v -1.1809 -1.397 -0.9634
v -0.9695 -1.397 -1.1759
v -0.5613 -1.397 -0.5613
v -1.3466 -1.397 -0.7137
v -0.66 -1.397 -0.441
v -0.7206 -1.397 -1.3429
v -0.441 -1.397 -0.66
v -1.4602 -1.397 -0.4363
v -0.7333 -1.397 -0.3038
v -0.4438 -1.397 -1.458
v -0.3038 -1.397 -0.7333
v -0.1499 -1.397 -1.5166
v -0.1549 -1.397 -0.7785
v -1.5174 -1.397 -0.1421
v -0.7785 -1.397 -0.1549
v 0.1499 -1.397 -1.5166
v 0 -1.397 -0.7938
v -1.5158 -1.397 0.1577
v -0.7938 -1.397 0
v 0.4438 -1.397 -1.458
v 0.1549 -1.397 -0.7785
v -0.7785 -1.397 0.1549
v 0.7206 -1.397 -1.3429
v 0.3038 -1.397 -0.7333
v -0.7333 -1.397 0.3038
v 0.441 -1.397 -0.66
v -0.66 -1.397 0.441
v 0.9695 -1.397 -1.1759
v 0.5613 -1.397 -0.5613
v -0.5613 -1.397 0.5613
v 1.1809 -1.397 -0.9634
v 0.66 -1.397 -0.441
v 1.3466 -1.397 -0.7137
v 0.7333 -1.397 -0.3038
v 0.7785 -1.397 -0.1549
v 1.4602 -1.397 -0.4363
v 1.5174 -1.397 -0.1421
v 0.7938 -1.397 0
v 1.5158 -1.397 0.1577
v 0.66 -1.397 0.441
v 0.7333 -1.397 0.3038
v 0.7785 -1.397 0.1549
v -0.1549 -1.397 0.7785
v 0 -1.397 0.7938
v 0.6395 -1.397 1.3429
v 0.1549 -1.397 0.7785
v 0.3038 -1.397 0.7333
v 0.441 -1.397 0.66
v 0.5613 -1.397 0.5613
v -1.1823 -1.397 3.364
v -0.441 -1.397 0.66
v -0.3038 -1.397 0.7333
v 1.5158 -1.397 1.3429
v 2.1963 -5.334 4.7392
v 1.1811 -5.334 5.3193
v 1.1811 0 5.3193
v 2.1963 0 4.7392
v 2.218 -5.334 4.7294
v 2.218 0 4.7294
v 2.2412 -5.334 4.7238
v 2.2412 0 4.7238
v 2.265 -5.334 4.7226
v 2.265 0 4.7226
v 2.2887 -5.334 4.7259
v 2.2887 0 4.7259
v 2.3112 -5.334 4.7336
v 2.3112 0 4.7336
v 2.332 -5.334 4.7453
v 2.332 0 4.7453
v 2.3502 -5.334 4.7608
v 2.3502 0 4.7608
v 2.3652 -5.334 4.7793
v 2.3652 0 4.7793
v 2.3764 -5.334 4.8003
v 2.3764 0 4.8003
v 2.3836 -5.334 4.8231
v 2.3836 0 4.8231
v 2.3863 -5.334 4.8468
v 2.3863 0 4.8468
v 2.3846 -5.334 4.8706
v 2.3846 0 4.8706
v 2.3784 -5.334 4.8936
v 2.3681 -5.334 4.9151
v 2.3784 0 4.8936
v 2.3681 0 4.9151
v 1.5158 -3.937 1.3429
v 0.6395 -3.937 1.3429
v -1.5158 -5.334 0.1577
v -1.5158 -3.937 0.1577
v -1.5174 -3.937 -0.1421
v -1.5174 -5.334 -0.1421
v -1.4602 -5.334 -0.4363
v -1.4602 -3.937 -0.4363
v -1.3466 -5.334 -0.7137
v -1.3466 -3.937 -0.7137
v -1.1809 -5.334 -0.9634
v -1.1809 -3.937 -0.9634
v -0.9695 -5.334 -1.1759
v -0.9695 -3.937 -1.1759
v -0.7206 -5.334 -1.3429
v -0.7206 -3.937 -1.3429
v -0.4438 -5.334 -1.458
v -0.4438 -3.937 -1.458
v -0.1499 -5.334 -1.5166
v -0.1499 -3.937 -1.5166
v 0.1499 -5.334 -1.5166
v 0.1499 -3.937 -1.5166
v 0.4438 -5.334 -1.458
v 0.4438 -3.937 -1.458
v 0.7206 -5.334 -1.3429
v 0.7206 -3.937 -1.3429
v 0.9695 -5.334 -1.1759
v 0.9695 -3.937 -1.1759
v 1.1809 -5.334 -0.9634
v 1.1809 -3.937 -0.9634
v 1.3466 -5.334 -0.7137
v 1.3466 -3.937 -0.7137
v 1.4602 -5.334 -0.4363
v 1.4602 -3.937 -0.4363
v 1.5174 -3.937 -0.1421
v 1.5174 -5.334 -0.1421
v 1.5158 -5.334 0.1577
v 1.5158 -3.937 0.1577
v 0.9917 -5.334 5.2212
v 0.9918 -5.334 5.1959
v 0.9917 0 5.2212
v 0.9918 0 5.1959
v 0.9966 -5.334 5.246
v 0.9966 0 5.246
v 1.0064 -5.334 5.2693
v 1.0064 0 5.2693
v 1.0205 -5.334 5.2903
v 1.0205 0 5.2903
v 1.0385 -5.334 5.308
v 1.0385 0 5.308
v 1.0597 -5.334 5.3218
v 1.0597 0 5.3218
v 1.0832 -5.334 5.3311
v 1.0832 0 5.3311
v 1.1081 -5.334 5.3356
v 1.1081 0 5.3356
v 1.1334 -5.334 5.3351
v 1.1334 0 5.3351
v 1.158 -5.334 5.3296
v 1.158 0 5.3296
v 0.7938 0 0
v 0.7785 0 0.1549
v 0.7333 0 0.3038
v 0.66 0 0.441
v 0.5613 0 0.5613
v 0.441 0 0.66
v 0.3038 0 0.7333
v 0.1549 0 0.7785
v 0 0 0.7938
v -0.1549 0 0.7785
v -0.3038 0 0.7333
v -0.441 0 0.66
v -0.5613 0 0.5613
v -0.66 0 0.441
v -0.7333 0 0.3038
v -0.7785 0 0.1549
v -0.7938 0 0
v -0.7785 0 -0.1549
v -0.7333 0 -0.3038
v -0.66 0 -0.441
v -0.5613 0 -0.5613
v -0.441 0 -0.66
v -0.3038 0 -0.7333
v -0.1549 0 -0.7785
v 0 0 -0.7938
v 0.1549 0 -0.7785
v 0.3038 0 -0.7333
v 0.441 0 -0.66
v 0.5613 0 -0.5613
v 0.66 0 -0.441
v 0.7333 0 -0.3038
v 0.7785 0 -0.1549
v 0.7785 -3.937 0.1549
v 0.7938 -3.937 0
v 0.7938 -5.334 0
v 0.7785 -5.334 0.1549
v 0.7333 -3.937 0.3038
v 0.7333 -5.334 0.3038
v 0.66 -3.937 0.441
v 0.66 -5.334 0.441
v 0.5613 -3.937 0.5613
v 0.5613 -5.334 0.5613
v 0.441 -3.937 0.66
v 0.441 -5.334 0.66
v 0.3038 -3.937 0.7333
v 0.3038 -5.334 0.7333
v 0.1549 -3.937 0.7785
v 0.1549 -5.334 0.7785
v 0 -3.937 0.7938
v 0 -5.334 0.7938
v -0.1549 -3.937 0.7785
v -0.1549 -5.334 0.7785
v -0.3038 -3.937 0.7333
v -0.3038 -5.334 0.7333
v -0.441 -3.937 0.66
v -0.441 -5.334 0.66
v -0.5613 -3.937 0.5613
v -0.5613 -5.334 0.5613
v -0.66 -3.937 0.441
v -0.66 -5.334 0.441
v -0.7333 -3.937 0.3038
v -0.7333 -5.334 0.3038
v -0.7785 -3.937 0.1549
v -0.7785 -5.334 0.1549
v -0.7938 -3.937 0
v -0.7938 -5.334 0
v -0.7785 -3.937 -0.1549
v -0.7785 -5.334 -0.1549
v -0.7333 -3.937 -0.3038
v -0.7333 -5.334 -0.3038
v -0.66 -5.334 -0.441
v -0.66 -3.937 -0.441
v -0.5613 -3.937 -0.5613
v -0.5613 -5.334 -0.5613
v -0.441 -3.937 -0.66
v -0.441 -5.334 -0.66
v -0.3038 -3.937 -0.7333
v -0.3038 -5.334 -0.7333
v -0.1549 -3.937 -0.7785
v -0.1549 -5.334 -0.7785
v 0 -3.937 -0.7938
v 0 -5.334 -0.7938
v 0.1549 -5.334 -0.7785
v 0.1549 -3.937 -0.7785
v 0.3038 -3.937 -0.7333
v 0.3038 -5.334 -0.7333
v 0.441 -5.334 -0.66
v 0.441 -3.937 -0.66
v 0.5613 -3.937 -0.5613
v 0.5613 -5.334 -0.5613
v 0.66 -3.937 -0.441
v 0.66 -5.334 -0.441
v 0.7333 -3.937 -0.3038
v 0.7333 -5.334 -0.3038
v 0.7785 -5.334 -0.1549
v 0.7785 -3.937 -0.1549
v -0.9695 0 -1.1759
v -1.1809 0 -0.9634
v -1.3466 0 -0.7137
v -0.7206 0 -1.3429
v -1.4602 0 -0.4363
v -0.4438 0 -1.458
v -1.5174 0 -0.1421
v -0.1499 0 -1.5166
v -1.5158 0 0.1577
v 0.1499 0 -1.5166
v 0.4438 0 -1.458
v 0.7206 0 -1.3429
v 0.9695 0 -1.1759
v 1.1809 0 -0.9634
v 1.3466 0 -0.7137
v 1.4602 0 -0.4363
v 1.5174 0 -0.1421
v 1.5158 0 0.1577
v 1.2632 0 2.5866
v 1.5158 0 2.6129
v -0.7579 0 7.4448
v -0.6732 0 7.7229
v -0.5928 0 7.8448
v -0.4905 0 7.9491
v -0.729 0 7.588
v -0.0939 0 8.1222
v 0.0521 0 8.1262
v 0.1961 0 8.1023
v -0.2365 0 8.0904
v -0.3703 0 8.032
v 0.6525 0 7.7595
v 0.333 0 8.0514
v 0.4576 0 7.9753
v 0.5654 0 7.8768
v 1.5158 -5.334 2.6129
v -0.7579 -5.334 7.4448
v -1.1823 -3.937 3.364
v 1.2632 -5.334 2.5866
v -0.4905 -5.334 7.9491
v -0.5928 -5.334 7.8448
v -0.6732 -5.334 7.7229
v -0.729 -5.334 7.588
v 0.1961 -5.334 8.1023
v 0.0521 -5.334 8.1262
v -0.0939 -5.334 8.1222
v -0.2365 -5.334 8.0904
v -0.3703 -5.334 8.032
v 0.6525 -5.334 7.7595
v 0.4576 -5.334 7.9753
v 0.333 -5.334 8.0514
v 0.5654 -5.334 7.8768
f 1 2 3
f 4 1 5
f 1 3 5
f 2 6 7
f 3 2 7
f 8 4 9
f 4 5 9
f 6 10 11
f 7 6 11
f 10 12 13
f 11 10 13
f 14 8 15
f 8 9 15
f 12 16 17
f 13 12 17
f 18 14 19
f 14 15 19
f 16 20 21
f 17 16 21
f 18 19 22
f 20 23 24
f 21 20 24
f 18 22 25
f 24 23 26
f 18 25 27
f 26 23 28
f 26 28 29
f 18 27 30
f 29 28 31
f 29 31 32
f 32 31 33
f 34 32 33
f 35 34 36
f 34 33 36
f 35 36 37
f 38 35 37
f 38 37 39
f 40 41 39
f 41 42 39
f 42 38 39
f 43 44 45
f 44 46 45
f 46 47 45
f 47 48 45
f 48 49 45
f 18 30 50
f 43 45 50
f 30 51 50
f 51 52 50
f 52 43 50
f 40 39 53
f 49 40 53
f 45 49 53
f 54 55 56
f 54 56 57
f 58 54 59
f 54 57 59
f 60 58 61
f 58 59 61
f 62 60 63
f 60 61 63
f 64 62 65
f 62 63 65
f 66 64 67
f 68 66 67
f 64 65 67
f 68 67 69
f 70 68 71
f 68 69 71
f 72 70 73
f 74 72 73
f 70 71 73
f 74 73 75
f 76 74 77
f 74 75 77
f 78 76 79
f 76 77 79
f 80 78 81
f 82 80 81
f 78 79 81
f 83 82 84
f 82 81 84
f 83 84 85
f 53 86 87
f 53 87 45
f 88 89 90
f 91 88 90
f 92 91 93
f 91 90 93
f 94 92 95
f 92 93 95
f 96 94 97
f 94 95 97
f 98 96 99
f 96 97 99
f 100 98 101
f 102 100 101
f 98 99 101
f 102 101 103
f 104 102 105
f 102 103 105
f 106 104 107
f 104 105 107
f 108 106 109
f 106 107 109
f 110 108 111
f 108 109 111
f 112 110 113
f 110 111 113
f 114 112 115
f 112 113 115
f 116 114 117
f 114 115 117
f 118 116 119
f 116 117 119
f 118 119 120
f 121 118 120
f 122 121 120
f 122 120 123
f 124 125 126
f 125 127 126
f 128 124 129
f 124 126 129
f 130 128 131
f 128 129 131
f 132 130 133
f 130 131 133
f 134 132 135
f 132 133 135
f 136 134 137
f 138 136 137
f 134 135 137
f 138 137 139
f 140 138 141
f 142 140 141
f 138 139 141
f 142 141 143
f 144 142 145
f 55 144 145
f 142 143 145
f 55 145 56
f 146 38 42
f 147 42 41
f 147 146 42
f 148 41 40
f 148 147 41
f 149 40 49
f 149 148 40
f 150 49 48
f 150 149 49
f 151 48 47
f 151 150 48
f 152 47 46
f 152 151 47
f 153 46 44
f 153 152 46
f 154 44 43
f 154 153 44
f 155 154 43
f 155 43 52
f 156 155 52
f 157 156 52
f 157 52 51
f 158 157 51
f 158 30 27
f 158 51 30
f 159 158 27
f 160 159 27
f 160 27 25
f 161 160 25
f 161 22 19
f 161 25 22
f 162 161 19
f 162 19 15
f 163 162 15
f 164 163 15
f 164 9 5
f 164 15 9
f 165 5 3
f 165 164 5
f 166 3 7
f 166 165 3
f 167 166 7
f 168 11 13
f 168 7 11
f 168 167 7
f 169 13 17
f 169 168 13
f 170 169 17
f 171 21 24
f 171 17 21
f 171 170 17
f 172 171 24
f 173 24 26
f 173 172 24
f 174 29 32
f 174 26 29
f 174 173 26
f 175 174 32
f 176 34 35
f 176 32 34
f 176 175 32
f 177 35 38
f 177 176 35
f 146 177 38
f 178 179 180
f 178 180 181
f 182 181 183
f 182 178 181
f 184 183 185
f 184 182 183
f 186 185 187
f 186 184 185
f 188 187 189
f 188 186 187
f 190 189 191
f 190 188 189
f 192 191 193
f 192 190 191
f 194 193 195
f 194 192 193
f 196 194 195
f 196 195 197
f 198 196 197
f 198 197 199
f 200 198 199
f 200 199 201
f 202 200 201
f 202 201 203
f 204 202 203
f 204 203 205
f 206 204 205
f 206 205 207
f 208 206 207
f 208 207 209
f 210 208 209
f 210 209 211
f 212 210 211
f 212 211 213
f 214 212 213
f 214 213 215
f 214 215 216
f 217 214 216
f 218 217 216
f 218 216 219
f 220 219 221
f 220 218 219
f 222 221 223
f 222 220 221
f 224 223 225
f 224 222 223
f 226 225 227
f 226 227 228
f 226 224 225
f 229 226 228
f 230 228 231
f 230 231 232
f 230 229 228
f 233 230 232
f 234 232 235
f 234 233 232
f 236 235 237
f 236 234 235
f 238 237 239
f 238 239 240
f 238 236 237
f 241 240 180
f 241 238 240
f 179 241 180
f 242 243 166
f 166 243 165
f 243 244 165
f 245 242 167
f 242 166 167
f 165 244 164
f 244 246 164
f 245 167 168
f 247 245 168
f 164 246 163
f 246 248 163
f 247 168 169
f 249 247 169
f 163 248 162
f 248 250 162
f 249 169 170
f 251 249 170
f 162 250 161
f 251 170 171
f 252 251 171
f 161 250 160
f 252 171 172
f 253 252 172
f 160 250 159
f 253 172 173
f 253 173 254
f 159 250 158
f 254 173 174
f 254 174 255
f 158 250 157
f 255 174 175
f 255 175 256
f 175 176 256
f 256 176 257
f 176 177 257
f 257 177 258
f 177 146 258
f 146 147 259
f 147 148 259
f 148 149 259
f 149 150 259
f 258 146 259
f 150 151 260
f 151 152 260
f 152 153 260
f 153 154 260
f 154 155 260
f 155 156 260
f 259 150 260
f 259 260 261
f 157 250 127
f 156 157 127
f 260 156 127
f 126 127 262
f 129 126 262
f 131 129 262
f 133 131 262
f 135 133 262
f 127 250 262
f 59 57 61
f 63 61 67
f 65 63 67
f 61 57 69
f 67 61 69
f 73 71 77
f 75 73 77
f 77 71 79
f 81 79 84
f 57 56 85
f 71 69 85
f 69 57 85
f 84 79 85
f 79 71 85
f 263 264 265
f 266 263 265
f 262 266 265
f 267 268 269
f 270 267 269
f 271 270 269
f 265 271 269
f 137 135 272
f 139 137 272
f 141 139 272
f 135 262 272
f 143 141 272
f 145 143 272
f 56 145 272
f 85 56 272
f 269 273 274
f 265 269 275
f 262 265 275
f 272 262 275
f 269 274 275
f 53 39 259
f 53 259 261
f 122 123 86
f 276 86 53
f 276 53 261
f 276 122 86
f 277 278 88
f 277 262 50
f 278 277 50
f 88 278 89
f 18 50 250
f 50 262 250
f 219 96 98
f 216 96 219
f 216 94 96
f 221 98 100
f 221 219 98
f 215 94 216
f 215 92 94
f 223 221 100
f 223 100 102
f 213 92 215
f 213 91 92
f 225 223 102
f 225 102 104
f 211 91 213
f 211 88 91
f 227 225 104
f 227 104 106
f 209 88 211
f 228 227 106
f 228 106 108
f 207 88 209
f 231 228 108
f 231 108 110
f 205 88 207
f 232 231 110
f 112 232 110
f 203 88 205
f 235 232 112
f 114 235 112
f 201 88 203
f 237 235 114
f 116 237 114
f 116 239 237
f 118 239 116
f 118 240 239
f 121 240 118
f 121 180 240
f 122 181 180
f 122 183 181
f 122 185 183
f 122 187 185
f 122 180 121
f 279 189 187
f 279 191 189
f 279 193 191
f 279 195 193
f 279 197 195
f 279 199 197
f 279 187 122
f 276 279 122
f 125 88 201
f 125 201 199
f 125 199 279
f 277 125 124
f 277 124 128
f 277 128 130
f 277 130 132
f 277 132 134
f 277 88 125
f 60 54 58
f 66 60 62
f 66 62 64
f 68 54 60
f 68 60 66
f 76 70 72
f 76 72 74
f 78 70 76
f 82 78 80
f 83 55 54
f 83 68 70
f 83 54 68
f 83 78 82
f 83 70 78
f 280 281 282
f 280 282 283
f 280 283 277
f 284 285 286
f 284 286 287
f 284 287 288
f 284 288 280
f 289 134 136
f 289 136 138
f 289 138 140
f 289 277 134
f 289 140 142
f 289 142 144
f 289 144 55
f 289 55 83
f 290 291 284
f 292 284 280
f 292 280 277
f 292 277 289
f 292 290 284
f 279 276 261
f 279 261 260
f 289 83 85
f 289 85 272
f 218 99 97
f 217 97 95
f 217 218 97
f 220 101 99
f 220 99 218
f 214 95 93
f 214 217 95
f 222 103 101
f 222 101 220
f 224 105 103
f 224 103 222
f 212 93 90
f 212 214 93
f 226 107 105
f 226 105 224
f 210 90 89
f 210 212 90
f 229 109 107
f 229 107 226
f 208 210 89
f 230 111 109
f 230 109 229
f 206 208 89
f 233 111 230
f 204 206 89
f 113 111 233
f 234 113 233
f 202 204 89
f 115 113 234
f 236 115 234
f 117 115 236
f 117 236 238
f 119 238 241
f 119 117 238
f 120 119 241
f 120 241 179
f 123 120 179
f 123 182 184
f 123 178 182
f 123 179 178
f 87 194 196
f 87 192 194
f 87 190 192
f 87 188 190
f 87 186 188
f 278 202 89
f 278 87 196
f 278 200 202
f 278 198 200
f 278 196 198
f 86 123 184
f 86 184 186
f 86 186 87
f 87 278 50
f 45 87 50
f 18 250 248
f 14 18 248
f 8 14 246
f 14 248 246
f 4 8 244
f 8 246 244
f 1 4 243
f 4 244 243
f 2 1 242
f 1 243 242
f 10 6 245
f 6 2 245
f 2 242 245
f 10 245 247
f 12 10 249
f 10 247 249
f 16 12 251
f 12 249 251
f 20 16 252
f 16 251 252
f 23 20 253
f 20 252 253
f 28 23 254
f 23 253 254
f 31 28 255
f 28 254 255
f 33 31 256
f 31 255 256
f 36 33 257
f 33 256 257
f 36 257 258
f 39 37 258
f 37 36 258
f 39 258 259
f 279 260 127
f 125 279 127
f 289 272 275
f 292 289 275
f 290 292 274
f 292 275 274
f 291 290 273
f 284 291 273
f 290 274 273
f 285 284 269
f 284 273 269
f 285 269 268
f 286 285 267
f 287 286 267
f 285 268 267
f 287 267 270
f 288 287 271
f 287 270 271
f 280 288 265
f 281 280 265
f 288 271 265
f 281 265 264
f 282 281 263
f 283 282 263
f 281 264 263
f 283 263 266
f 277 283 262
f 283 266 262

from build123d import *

# Parameters (mm, degrees)
F0_R          = 0.79375
F1_DEPTH      = 5.334
F3_DEPTH      = 5.334
F4_R          = 0.127
F5_W          = 2.54
F5_H          = 2.8669180299
F6_DEPTH      = 3.0408234879
F6_DEPTH_BACK = 0.8715074616
F7_SIZE       = 2.032


with BuildPart() as f1:
    # F0 (on Front) → F1 (new body)
    with BuildSketch(Plane.XZ):
        with BuildLine():
            ThreePointArc((-1.5158234879, 0.1576551724), (0, -1.524), (1.5158234879, 0.1576551724))
            Line((1.5158234879, 0.1576551724), (0.757911744, 7.4448275862))
            ThreePointArc((0.757911744, 7.4448275862), (0, 8.128), (-0.757911744, 7.4448275862))
            Line((-0.757911744, 7.4448275862), (-1.5158234879, 0.1576551724))
        make_face()
        Circle(F0_R, mode=Mode.SUBTRACT)
    extrude(amount=F1_DEPTH)

    # F2 (on face) → F3 (join, through all)
    with BuildSketch(Plane.XZ.offset(5.334)):
        Polygon((1.5158234879, 2.6129180299), (1.2631934914, 2.586642922), (1.5158234879, 0.1576551724), align=None)
        with BuildLine():
            Line((2.62023831, 4.4970114676), (0.6525069605, 7.7595462699))
            ThreePointArc((0.6525069605, 7.7595462699), (0.7225525537, 7.6079954691), (0.757911744, 7.4448275862))
            Line((0.757911744, 7.4448275862), (0.9662072397, 5.4421073456))
            Line((0.9662072397, 5.4421073456), (2.62023831, 4.4970114676))
        make_face()
    extrude(amount=-F3_DEPTH)

    # F4
    f4_edges = [f1.edges().sort_by_distance(p)[0] for p in [
        (2.620238, -2.667, 4.497011),
        (0.966207, -2.667, 5.442107),
    ]]
    fillet(f4_edges, radius=F4_R)

    # F5 (on face) → F6 (cut, two sides)
    with BuildSketch(Plane.YZ.offset(1.5158234879)) as f6_sk:
        with Locations((-2.667, -0.090540985)):
            Rectangle(F5_W, F5_H)
    extrude(amount=-F6_DEPTH, mode=Mode.SUBTRACT)
    extrude(f6_sk.sketch, amount=F6_DEPTH_BACK, mode=Mode.SUBTRACT)

    # F7
    f7_edges = [f1.edges().sort_by_distance(p)[0] for p in [
        (-1.392549, -2.667, 1.342918),
    ]]
    chamfer(f7_edges, length=F7_SIZE)


solid = f1.part
